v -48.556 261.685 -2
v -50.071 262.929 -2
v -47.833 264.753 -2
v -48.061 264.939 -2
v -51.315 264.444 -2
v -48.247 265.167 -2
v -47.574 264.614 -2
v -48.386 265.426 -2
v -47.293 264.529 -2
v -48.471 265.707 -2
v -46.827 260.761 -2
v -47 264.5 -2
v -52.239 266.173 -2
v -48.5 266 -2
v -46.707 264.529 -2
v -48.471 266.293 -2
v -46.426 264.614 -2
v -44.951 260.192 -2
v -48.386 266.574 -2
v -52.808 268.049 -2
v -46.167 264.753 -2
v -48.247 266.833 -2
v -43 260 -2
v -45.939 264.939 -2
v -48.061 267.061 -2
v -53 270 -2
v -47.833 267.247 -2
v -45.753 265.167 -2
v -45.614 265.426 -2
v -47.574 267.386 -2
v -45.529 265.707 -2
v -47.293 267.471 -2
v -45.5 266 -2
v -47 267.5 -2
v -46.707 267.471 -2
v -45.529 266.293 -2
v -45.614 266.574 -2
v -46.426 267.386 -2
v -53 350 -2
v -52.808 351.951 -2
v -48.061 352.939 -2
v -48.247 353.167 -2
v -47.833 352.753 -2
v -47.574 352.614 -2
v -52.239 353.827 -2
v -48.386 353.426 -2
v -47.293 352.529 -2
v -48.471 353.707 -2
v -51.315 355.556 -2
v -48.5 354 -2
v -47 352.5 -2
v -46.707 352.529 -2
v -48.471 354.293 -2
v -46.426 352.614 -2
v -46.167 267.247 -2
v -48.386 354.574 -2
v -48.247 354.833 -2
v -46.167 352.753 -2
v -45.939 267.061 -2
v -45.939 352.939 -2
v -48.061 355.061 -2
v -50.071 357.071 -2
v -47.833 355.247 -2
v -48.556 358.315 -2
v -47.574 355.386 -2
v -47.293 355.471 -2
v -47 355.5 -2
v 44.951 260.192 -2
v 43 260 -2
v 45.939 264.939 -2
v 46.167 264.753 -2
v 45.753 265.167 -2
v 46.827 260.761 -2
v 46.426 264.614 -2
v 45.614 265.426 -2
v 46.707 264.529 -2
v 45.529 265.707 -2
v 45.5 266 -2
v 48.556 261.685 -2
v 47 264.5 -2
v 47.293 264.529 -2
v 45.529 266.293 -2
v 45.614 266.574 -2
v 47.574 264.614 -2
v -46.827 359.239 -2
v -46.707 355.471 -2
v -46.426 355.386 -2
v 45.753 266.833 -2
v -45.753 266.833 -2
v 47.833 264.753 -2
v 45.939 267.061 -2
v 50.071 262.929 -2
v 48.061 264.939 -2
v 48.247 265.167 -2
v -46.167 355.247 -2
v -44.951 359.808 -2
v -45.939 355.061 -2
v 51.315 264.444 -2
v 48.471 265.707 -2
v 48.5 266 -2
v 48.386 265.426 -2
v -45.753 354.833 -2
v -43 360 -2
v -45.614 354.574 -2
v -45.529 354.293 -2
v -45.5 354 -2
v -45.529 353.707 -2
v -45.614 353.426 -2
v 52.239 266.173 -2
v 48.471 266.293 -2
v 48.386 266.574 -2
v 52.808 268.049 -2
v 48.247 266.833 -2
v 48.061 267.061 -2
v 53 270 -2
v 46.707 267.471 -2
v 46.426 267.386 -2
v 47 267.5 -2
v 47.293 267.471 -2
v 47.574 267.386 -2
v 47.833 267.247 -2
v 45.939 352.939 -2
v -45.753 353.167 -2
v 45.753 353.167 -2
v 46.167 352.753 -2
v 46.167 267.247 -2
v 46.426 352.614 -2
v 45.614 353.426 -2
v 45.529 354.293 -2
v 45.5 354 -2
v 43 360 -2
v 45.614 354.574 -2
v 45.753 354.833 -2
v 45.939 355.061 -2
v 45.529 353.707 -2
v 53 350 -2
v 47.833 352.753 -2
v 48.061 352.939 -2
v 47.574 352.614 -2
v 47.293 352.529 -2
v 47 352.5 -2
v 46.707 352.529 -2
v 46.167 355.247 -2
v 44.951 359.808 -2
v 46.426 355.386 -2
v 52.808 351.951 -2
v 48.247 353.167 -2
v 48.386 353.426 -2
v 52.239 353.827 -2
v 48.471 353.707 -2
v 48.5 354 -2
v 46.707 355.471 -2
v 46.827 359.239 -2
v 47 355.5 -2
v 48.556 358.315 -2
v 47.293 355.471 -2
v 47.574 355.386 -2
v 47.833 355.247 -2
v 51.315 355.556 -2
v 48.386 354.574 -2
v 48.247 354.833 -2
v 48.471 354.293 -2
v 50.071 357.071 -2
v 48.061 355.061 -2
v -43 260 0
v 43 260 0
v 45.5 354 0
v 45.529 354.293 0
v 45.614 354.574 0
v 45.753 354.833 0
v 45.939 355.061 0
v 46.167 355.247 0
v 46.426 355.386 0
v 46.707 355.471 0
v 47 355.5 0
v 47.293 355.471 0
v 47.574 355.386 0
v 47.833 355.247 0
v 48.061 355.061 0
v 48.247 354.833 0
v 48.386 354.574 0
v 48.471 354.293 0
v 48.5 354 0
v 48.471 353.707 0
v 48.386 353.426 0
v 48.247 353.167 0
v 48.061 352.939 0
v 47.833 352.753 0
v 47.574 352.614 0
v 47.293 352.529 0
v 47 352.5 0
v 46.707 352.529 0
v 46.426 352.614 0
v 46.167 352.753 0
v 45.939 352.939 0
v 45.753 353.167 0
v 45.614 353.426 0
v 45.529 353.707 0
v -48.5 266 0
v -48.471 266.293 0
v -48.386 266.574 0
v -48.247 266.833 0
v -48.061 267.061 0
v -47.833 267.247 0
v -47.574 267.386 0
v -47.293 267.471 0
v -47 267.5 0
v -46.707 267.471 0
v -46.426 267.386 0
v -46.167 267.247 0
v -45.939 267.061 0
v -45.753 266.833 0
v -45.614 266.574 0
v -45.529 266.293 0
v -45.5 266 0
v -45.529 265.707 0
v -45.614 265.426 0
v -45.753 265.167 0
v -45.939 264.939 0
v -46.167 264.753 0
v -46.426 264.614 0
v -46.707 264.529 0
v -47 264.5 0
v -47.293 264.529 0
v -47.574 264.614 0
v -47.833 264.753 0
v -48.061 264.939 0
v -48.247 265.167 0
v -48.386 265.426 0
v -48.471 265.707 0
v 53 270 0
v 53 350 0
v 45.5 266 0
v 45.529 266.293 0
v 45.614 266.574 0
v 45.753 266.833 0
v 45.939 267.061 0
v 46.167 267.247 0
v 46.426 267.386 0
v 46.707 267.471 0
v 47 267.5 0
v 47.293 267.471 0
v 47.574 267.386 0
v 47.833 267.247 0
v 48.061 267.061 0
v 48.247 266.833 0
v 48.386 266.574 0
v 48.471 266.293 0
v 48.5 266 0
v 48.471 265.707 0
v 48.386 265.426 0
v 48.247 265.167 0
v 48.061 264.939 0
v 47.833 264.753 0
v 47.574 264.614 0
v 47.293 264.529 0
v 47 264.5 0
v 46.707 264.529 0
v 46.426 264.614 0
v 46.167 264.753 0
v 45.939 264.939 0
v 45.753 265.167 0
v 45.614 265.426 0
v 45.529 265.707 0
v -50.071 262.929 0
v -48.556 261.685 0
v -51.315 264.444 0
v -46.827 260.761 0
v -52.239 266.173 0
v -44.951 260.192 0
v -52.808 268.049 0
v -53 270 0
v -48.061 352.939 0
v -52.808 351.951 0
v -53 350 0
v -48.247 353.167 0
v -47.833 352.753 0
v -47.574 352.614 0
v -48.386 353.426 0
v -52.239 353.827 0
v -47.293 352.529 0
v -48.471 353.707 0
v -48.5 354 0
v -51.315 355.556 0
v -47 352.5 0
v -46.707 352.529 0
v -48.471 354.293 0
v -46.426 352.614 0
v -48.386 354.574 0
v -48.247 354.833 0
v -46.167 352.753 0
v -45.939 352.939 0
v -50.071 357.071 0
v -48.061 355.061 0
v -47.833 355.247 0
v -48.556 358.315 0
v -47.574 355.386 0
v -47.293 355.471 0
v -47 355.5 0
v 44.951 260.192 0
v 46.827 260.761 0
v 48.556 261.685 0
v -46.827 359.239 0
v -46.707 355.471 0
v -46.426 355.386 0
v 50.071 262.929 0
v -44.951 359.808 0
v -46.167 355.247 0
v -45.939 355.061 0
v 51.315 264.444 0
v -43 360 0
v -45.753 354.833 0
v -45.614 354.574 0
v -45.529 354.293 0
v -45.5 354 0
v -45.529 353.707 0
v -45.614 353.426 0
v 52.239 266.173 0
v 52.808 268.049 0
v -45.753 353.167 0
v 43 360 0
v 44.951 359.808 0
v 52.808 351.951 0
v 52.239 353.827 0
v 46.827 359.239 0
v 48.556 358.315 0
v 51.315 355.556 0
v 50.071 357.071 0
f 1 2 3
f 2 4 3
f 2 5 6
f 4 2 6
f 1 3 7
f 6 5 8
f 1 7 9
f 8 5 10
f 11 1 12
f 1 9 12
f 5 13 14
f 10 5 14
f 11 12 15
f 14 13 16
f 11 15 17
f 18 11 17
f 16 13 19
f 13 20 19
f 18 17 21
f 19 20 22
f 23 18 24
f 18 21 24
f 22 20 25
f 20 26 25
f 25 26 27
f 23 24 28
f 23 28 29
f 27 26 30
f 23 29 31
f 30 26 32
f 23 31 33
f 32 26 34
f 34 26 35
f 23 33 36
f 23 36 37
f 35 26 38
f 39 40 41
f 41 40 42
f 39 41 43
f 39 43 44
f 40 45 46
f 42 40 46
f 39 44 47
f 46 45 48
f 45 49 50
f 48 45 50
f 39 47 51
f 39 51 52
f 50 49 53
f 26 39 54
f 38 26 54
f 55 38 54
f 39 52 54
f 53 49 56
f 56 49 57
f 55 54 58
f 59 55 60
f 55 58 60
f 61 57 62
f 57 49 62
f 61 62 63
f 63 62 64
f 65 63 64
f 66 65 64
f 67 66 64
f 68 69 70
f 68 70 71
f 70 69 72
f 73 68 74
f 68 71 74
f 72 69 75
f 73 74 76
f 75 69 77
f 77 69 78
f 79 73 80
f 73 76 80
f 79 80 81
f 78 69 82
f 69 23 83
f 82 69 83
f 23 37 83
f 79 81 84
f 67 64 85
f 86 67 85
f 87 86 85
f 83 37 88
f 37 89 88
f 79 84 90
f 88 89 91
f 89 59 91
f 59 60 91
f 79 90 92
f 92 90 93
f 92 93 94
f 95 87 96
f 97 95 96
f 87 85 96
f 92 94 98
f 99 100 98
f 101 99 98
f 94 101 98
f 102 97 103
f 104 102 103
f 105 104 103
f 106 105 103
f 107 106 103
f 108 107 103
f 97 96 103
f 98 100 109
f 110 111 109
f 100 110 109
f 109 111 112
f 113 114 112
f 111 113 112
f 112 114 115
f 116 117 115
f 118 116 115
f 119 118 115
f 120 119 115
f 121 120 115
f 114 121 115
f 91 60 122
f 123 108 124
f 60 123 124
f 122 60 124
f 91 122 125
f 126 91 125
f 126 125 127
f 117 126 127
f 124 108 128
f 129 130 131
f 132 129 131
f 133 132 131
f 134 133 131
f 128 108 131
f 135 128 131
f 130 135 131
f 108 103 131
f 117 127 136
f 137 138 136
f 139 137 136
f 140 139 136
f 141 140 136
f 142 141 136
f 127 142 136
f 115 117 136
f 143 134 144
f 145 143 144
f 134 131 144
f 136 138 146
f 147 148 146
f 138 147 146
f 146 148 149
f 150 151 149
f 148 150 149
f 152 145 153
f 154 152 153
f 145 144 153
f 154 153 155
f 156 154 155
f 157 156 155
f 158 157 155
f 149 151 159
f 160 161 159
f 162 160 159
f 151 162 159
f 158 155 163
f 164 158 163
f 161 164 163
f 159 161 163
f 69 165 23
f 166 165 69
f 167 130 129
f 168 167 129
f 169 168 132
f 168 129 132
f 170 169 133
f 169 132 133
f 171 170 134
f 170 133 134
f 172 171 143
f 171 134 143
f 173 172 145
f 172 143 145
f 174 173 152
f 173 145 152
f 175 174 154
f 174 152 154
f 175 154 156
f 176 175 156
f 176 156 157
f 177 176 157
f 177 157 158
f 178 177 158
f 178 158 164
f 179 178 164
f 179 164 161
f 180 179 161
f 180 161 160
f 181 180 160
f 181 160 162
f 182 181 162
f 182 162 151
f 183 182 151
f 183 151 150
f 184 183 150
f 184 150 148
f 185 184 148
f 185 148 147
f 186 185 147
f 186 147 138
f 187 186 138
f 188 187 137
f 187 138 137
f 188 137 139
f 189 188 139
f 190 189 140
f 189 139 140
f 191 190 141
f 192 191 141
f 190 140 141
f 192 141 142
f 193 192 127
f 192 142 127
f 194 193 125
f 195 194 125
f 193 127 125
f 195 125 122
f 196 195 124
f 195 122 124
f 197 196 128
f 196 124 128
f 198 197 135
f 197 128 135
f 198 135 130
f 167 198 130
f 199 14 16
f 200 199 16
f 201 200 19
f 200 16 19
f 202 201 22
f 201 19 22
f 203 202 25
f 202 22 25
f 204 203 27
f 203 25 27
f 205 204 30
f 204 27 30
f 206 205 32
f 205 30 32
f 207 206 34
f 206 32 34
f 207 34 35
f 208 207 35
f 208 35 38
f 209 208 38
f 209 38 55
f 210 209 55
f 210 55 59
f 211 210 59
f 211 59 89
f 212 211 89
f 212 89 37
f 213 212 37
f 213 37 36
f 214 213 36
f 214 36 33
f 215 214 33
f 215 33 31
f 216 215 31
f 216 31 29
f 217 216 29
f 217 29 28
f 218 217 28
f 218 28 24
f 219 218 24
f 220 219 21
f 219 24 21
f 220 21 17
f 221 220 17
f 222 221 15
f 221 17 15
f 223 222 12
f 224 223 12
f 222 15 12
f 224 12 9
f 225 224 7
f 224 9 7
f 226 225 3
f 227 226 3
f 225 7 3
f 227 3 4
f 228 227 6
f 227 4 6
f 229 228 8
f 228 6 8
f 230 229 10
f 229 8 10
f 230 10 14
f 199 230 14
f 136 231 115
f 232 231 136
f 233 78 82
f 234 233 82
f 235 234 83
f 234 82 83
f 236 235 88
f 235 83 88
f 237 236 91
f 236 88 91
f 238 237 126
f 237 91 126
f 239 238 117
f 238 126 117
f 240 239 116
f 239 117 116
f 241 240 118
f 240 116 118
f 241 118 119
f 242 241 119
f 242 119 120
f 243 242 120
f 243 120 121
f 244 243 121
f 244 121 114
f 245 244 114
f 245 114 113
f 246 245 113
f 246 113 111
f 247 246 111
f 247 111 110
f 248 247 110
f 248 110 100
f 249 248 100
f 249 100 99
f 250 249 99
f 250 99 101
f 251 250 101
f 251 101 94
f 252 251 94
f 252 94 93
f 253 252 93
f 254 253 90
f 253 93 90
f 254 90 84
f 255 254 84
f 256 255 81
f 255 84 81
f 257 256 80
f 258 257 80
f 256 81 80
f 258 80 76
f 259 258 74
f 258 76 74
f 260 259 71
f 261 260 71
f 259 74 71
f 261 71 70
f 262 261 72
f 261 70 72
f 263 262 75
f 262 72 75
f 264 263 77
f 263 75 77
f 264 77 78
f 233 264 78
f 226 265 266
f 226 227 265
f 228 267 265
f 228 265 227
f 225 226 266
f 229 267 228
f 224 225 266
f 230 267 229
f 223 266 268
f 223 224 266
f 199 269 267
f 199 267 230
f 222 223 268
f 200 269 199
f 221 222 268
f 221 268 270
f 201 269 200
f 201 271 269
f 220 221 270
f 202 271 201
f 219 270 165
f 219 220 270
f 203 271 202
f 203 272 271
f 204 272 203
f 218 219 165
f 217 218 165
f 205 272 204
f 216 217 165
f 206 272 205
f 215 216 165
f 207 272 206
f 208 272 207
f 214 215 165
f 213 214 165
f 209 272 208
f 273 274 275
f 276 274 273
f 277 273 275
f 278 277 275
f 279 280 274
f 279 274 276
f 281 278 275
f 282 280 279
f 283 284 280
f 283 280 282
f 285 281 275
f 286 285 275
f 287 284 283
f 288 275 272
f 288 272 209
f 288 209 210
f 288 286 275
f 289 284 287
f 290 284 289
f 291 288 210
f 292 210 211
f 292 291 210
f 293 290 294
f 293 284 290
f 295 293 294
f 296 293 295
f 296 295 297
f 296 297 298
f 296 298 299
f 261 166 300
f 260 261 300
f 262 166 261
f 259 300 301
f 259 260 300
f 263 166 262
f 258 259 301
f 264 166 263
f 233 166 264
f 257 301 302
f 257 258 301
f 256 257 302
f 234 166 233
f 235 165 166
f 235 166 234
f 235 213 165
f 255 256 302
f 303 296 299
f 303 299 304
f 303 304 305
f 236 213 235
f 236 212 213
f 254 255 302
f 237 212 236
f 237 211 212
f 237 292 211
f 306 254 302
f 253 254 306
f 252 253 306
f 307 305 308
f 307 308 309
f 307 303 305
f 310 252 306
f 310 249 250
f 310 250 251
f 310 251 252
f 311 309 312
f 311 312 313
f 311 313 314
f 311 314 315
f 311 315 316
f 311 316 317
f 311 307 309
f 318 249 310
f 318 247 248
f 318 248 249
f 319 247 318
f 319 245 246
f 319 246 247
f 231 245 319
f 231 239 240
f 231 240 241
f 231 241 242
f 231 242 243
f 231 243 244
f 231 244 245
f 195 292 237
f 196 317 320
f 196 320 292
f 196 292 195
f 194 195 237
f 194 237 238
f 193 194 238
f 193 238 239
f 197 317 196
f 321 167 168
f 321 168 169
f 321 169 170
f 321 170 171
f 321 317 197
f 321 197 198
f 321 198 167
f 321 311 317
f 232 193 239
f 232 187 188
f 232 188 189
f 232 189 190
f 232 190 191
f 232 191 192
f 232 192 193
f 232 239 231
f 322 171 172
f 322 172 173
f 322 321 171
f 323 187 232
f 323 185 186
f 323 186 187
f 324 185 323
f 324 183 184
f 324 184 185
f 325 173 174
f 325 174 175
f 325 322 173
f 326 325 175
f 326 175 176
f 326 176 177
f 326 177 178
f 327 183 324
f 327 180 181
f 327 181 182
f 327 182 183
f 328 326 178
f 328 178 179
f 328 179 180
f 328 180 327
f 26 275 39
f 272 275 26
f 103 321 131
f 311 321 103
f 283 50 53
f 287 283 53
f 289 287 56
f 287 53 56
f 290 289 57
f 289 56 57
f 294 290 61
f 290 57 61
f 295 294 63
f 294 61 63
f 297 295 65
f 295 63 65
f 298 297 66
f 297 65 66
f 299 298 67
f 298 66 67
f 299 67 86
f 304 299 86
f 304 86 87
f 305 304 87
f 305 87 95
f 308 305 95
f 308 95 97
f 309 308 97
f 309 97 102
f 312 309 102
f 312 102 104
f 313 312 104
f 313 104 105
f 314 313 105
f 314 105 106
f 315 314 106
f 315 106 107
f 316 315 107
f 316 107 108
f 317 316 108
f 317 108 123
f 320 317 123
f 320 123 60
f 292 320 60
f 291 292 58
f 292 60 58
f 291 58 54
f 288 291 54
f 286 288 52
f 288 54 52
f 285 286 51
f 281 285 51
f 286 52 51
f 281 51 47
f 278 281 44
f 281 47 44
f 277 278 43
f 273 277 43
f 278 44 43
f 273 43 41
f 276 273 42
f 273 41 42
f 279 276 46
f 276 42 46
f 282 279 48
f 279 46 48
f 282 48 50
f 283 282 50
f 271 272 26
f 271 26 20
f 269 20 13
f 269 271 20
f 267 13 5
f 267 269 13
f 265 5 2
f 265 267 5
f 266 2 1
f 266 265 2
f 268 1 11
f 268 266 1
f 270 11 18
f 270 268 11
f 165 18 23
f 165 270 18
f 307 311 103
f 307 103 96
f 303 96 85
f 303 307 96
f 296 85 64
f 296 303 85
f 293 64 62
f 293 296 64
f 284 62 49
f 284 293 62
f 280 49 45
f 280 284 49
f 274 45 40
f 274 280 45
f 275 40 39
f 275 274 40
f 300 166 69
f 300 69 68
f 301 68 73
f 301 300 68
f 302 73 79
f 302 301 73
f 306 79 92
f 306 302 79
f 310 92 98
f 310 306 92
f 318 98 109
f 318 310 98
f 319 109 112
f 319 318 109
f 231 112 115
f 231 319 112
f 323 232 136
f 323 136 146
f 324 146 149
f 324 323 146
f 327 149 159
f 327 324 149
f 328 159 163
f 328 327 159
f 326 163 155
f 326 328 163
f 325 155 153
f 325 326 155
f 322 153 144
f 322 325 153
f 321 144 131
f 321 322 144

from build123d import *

# Parameters (mm, degrees)
BOSS_EXTRUDE1_DEPTH = 2
SKETCH2_R           = 1.5
CUT_EXTRUDE1_DEPTH  = 3


with BuildPart() as part:
    # Sketch1 → Boss-Extrude1 (new body)
    with BuildSketch(Plane.XY):
        with BuildLine():
            Line((-43, 260), (43, 260))
            ThreePointArc((43, 260), (50.071067812, 262.928932188), (53, 270))
            Line((53, 270), (53, 350))
            ThreePointArc((53, 350), (50.071067812, 357.071067812), (43, 360))
            Line((43, 360), (-43, 360))
            ThreePointArc((-43, 360), (-50.071067812, 357.071067812), (-53, 350))
            Line((-53, 350), (-53, 270))
            ThreePointArc((-53, 270), (-50.071067812, 262.928932188), (-43, 260))
        make_face()
    extrude(amount=-BOSS_EXTRUDE1_DEPTH)

    # Sketch2 → Cut-Extrude1 (cut)
    with BuildSketch(Plane(origin=(0, 0, -2), x_dir=(-1, 0, 0), z_dir=(0, 0, -1))):
        with Locations((47, 266)):
            Circle(SKETCH2_R)
        with Locations((47, 354)):
            Circle(SKETCH2_R)
        with Locations((-47, 354)):
            Circle(SKETCH2_R)
        with Locations((-47, 266)):
            Circle(SKETCH2_R)
    extrude(amount=-CUT_EXTRUDE1_DEPTH, mode=Mode.SUBTRACT)


solid = part.part
